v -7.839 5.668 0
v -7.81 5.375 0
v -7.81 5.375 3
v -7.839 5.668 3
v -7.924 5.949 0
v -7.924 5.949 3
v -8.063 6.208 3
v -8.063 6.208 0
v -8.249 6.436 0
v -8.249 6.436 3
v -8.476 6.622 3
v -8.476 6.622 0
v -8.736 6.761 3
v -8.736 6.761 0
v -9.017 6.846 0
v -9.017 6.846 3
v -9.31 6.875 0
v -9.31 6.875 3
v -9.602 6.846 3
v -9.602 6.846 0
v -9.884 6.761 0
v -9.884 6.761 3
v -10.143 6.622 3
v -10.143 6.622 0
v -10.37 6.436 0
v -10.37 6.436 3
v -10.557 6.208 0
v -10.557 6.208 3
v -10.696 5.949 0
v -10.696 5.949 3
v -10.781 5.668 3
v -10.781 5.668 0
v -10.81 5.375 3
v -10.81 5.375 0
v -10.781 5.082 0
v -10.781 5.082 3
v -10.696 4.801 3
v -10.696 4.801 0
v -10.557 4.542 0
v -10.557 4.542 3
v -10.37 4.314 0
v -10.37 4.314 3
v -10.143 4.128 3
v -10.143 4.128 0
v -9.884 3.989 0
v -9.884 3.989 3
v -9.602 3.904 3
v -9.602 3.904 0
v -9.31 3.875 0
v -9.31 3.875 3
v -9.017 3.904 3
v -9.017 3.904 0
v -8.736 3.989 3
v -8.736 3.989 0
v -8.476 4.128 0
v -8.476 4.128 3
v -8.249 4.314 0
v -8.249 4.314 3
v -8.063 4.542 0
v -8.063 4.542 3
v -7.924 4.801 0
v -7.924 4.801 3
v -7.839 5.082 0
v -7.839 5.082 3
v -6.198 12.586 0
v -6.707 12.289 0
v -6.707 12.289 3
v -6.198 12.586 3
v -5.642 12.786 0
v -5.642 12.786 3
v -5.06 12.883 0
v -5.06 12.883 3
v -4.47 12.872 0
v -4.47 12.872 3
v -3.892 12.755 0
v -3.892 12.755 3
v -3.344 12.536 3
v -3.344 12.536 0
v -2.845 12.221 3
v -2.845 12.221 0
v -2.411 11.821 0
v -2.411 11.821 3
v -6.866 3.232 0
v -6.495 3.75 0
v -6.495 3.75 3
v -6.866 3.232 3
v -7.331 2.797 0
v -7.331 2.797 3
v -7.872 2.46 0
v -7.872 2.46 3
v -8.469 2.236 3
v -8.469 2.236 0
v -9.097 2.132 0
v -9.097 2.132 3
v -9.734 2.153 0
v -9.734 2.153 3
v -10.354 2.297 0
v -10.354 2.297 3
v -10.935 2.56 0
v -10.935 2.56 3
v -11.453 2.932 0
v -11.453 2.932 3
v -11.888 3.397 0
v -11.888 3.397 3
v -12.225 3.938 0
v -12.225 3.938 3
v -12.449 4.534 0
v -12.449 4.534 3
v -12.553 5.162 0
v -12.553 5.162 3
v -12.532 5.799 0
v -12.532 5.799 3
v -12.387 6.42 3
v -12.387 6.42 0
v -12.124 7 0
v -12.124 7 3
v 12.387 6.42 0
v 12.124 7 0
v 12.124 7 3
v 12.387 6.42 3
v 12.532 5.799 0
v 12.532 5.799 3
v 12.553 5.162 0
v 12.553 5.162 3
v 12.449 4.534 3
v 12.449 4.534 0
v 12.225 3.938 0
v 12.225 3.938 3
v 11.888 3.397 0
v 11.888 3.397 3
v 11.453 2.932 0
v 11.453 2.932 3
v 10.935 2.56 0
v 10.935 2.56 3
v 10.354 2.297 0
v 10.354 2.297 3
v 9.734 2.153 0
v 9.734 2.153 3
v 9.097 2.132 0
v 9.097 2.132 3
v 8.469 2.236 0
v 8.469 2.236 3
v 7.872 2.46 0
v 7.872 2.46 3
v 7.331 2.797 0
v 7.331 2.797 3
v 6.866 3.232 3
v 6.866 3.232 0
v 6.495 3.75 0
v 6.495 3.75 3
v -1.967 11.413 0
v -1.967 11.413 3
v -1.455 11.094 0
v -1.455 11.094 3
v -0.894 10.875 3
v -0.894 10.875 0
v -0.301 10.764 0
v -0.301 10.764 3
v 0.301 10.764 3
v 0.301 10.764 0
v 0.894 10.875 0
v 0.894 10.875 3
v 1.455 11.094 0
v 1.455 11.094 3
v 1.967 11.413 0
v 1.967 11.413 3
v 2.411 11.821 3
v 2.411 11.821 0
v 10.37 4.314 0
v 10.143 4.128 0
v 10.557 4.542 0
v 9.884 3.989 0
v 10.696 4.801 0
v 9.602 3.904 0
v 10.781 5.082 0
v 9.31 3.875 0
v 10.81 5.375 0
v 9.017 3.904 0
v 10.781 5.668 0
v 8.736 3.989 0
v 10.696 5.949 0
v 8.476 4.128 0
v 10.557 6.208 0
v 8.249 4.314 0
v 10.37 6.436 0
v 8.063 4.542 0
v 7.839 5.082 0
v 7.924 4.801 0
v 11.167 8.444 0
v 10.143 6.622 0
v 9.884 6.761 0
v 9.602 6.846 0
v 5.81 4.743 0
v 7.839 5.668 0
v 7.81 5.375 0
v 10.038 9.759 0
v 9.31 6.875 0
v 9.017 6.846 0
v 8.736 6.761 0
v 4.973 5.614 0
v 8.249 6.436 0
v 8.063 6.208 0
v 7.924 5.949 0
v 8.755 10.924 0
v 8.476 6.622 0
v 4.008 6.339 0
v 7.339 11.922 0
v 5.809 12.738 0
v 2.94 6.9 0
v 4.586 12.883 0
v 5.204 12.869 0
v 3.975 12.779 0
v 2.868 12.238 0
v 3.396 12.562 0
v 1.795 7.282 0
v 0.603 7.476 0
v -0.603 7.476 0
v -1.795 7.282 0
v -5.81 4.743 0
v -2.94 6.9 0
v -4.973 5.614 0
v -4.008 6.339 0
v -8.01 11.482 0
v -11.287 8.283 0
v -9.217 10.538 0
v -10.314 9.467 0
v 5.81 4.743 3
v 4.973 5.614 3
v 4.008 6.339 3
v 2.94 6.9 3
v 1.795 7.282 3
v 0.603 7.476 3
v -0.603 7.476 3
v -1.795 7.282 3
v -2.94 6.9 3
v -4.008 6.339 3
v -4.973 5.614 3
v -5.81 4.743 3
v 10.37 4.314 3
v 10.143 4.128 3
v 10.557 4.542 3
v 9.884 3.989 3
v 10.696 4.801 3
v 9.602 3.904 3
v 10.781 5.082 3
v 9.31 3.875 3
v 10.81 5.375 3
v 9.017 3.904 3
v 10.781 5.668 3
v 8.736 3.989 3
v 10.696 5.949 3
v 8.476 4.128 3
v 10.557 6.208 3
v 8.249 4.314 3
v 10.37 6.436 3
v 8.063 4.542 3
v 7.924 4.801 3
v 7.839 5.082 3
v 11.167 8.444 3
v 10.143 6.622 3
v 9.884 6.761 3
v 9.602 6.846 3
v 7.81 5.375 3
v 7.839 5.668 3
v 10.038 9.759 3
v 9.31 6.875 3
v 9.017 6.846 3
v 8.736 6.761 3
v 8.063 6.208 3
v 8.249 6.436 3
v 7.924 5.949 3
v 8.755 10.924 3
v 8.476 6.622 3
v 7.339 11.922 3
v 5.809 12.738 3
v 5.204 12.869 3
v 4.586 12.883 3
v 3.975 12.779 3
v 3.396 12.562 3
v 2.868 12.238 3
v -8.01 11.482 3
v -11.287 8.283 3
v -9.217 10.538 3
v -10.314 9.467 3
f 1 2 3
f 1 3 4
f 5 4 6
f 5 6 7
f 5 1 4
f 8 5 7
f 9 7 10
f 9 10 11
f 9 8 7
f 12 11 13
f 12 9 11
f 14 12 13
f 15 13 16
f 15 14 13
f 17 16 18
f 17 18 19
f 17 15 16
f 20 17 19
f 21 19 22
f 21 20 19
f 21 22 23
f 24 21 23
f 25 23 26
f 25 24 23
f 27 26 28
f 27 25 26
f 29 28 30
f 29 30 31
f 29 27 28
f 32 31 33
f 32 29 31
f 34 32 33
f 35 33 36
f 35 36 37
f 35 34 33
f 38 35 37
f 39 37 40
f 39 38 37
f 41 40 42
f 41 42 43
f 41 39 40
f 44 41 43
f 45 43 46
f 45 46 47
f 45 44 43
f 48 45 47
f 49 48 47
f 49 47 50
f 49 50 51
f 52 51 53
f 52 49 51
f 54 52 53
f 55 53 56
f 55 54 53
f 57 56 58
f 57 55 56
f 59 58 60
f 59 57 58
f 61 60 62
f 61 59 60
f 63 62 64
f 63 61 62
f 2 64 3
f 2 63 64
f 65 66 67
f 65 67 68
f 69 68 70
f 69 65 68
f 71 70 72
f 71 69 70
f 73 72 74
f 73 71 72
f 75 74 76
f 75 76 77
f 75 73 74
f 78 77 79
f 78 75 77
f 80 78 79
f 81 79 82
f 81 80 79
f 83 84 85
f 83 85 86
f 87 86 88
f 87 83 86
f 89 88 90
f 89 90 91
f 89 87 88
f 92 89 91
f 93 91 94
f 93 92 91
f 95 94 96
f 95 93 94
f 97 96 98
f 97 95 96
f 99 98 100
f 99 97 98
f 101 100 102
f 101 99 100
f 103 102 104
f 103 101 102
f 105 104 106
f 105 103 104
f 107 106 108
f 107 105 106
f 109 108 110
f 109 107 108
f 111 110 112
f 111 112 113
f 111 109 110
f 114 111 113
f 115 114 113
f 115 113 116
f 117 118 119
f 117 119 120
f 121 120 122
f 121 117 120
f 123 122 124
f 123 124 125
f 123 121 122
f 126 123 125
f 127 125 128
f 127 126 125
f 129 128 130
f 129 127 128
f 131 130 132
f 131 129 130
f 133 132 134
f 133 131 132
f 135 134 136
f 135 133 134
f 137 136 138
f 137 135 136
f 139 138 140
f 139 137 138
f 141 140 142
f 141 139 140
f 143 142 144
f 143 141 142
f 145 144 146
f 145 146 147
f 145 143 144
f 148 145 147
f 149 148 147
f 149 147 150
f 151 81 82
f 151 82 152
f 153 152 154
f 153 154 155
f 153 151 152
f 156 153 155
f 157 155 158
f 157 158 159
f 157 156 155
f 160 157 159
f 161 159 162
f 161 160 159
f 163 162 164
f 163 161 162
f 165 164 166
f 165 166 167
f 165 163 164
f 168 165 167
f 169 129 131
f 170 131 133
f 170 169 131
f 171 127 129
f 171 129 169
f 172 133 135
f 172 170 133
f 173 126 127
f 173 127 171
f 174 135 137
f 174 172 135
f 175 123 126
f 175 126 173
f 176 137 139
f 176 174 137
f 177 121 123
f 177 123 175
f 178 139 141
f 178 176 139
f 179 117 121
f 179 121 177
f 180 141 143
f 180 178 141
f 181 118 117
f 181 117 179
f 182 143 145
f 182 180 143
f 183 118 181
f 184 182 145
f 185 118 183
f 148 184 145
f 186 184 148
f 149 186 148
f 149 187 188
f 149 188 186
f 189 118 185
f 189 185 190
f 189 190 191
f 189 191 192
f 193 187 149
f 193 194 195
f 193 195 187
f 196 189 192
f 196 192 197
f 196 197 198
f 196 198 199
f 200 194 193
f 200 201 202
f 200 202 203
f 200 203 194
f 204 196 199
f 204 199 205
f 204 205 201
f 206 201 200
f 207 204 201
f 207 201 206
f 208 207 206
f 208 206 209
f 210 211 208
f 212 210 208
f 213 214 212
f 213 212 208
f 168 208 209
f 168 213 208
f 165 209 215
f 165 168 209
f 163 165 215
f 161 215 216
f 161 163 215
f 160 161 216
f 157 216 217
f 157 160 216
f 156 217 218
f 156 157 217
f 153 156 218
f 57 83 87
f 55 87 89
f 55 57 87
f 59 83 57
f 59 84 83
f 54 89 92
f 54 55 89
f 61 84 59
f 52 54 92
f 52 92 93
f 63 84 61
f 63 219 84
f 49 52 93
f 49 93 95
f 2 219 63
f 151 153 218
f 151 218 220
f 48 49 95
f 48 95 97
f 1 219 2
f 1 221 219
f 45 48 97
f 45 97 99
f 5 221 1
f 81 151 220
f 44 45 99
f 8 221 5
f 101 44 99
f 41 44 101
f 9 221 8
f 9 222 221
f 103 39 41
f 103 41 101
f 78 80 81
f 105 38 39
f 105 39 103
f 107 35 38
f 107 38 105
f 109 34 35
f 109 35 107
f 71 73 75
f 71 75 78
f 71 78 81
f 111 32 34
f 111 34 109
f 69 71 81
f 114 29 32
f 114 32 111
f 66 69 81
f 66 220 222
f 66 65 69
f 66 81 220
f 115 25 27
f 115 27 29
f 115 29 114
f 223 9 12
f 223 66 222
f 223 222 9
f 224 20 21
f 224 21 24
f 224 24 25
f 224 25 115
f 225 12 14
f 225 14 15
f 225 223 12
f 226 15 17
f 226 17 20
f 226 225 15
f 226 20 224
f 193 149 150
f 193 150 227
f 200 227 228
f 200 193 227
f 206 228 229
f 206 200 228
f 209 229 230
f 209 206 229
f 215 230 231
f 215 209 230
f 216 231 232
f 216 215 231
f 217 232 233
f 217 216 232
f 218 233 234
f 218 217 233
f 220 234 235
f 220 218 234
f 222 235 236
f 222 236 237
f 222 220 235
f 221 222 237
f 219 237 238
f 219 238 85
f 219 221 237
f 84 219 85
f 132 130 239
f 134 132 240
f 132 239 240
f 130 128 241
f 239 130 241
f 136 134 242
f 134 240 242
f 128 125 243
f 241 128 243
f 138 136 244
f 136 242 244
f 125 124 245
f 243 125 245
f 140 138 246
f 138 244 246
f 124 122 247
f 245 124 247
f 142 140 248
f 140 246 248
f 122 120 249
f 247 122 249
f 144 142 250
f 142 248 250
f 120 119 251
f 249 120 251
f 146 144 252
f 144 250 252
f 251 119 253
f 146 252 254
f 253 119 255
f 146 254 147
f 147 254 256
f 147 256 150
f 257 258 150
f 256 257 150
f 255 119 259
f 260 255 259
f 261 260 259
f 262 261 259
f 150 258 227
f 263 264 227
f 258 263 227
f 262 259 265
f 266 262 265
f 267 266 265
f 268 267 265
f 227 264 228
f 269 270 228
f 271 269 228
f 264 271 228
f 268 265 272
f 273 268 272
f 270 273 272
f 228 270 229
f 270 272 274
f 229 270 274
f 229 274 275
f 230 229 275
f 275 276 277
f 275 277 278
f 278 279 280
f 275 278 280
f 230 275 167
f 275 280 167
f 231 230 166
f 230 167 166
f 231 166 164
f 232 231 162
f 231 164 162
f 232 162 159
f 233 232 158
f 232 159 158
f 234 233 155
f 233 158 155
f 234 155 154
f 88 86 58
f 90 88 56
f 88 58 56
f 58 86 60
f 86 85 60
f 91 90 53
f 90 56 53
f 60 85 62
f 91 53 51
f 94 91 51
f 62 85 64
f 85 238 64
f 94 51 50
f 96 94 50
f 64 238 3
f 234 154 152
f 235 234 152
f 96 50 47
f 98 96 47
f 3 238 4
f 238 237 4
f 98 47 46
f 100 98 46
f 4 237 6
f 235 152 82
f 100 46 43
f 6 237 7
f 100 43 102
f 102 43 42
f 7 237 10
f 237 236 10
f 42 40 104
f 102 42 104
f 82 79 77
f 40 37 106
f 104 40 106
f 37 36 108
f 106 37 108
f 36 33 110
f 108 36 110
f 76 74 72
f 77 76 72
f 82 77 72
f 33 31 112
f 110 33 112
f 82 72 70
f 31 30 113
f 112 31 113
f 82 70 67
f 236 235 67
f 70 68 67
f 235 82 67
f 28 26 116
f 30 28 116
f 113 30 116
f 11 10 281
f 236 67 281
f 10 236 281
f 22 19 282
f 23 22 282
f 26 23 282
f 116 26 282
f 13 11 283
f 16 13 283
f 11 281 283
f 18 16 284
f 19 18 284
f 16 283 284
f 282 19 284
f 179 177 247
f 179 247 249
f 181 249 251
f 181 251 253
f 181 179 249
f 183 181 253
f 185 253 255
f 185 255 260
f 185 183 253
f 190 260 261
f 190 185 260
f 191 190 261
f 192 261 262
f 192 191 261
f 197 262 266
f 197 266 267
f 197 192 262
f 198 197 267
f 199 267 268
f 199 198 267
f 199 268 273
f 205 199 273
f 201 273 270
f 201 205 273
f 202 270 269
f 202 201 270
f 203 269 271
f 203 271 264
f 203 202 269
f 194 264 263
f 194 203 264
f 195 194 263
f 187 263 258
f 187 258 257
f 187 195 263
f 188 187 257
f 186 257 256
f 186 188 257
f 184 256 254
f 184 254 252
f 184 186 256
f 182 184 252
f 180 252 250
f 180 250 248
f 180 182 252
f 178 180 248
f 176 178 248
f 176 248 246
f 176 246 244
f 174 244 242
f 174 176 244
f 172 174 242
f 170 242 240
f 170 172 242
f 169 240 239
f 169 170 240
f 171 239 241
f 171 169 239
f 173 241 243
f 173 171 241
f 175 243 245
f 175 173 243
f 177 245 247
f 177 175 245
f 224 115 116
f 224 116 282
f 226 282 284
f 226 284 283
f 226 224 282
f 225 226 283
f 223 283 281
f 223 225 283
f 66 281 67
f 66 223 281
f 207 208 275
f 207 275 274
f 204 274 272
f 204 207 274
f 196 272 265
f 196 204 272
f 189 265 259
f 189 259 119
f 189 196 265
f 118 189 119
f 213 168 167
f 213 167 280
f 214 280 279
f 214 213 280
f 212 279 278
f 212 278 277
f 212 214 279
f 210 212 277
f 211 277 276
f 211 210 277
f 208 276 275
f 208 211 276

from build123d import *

# Parameters (mm, degrees)
ESQUISSE1_R        = 1.5
BOSS_EXTRU_2_DEPTH = 3


with BuildPart() as part:
    # Esquisse1 → Boss.-Extru.2 (new body)
    with BuildSketch(Plane.XY):
        with BuildLine():
            ThreePointArc((-2.411034891, 11.820685714), (0, 10.75), (2.411034891, 11.820685714))
            ThreePointArc((2.411034891, 11.820685714), (3.975330286, 12.779130538), (5.80943088, 12.737759334))
            ThreePointArc((5.80943088, 12.737759334), (9.414650572, 10.36167721), (12.124355653, 7))
            ThreePointArc((12.124355653, 7), (10.934773091, 2.560417438), (6.495190528, 3.75))
            ThreePointArc((6.495190528, 3.75), (0, 7.5), (-6.495190528, 3.75))
            ThreePointArc((-6.495190528, 3.75), (-10.934773091, 2.560417438), (-12.124355653, 7))
            ThreePointArc((-12.124355653, 7), (-9.780131311, 10.017436376), (-6.707371512, 12.288660114))
            ThreePointArc((-6.707371512, 12.288660114), (-4.47014813, 12.872261577), (-2.411034891, 11.820685714))
        make_face()
        with Locations((9.309773091, 5.375)):
            Circle(ESQUISSE1_R, mode=Mode.SUBTRACT)
        with Locations((-9.309773091, 5.375)):
            Circle(ESQUISSE1_R, mode=Mode.SUBTRACT)
    extrude(amount=BOSS_EXTRU_2_DEPTH)


solid = part.part
